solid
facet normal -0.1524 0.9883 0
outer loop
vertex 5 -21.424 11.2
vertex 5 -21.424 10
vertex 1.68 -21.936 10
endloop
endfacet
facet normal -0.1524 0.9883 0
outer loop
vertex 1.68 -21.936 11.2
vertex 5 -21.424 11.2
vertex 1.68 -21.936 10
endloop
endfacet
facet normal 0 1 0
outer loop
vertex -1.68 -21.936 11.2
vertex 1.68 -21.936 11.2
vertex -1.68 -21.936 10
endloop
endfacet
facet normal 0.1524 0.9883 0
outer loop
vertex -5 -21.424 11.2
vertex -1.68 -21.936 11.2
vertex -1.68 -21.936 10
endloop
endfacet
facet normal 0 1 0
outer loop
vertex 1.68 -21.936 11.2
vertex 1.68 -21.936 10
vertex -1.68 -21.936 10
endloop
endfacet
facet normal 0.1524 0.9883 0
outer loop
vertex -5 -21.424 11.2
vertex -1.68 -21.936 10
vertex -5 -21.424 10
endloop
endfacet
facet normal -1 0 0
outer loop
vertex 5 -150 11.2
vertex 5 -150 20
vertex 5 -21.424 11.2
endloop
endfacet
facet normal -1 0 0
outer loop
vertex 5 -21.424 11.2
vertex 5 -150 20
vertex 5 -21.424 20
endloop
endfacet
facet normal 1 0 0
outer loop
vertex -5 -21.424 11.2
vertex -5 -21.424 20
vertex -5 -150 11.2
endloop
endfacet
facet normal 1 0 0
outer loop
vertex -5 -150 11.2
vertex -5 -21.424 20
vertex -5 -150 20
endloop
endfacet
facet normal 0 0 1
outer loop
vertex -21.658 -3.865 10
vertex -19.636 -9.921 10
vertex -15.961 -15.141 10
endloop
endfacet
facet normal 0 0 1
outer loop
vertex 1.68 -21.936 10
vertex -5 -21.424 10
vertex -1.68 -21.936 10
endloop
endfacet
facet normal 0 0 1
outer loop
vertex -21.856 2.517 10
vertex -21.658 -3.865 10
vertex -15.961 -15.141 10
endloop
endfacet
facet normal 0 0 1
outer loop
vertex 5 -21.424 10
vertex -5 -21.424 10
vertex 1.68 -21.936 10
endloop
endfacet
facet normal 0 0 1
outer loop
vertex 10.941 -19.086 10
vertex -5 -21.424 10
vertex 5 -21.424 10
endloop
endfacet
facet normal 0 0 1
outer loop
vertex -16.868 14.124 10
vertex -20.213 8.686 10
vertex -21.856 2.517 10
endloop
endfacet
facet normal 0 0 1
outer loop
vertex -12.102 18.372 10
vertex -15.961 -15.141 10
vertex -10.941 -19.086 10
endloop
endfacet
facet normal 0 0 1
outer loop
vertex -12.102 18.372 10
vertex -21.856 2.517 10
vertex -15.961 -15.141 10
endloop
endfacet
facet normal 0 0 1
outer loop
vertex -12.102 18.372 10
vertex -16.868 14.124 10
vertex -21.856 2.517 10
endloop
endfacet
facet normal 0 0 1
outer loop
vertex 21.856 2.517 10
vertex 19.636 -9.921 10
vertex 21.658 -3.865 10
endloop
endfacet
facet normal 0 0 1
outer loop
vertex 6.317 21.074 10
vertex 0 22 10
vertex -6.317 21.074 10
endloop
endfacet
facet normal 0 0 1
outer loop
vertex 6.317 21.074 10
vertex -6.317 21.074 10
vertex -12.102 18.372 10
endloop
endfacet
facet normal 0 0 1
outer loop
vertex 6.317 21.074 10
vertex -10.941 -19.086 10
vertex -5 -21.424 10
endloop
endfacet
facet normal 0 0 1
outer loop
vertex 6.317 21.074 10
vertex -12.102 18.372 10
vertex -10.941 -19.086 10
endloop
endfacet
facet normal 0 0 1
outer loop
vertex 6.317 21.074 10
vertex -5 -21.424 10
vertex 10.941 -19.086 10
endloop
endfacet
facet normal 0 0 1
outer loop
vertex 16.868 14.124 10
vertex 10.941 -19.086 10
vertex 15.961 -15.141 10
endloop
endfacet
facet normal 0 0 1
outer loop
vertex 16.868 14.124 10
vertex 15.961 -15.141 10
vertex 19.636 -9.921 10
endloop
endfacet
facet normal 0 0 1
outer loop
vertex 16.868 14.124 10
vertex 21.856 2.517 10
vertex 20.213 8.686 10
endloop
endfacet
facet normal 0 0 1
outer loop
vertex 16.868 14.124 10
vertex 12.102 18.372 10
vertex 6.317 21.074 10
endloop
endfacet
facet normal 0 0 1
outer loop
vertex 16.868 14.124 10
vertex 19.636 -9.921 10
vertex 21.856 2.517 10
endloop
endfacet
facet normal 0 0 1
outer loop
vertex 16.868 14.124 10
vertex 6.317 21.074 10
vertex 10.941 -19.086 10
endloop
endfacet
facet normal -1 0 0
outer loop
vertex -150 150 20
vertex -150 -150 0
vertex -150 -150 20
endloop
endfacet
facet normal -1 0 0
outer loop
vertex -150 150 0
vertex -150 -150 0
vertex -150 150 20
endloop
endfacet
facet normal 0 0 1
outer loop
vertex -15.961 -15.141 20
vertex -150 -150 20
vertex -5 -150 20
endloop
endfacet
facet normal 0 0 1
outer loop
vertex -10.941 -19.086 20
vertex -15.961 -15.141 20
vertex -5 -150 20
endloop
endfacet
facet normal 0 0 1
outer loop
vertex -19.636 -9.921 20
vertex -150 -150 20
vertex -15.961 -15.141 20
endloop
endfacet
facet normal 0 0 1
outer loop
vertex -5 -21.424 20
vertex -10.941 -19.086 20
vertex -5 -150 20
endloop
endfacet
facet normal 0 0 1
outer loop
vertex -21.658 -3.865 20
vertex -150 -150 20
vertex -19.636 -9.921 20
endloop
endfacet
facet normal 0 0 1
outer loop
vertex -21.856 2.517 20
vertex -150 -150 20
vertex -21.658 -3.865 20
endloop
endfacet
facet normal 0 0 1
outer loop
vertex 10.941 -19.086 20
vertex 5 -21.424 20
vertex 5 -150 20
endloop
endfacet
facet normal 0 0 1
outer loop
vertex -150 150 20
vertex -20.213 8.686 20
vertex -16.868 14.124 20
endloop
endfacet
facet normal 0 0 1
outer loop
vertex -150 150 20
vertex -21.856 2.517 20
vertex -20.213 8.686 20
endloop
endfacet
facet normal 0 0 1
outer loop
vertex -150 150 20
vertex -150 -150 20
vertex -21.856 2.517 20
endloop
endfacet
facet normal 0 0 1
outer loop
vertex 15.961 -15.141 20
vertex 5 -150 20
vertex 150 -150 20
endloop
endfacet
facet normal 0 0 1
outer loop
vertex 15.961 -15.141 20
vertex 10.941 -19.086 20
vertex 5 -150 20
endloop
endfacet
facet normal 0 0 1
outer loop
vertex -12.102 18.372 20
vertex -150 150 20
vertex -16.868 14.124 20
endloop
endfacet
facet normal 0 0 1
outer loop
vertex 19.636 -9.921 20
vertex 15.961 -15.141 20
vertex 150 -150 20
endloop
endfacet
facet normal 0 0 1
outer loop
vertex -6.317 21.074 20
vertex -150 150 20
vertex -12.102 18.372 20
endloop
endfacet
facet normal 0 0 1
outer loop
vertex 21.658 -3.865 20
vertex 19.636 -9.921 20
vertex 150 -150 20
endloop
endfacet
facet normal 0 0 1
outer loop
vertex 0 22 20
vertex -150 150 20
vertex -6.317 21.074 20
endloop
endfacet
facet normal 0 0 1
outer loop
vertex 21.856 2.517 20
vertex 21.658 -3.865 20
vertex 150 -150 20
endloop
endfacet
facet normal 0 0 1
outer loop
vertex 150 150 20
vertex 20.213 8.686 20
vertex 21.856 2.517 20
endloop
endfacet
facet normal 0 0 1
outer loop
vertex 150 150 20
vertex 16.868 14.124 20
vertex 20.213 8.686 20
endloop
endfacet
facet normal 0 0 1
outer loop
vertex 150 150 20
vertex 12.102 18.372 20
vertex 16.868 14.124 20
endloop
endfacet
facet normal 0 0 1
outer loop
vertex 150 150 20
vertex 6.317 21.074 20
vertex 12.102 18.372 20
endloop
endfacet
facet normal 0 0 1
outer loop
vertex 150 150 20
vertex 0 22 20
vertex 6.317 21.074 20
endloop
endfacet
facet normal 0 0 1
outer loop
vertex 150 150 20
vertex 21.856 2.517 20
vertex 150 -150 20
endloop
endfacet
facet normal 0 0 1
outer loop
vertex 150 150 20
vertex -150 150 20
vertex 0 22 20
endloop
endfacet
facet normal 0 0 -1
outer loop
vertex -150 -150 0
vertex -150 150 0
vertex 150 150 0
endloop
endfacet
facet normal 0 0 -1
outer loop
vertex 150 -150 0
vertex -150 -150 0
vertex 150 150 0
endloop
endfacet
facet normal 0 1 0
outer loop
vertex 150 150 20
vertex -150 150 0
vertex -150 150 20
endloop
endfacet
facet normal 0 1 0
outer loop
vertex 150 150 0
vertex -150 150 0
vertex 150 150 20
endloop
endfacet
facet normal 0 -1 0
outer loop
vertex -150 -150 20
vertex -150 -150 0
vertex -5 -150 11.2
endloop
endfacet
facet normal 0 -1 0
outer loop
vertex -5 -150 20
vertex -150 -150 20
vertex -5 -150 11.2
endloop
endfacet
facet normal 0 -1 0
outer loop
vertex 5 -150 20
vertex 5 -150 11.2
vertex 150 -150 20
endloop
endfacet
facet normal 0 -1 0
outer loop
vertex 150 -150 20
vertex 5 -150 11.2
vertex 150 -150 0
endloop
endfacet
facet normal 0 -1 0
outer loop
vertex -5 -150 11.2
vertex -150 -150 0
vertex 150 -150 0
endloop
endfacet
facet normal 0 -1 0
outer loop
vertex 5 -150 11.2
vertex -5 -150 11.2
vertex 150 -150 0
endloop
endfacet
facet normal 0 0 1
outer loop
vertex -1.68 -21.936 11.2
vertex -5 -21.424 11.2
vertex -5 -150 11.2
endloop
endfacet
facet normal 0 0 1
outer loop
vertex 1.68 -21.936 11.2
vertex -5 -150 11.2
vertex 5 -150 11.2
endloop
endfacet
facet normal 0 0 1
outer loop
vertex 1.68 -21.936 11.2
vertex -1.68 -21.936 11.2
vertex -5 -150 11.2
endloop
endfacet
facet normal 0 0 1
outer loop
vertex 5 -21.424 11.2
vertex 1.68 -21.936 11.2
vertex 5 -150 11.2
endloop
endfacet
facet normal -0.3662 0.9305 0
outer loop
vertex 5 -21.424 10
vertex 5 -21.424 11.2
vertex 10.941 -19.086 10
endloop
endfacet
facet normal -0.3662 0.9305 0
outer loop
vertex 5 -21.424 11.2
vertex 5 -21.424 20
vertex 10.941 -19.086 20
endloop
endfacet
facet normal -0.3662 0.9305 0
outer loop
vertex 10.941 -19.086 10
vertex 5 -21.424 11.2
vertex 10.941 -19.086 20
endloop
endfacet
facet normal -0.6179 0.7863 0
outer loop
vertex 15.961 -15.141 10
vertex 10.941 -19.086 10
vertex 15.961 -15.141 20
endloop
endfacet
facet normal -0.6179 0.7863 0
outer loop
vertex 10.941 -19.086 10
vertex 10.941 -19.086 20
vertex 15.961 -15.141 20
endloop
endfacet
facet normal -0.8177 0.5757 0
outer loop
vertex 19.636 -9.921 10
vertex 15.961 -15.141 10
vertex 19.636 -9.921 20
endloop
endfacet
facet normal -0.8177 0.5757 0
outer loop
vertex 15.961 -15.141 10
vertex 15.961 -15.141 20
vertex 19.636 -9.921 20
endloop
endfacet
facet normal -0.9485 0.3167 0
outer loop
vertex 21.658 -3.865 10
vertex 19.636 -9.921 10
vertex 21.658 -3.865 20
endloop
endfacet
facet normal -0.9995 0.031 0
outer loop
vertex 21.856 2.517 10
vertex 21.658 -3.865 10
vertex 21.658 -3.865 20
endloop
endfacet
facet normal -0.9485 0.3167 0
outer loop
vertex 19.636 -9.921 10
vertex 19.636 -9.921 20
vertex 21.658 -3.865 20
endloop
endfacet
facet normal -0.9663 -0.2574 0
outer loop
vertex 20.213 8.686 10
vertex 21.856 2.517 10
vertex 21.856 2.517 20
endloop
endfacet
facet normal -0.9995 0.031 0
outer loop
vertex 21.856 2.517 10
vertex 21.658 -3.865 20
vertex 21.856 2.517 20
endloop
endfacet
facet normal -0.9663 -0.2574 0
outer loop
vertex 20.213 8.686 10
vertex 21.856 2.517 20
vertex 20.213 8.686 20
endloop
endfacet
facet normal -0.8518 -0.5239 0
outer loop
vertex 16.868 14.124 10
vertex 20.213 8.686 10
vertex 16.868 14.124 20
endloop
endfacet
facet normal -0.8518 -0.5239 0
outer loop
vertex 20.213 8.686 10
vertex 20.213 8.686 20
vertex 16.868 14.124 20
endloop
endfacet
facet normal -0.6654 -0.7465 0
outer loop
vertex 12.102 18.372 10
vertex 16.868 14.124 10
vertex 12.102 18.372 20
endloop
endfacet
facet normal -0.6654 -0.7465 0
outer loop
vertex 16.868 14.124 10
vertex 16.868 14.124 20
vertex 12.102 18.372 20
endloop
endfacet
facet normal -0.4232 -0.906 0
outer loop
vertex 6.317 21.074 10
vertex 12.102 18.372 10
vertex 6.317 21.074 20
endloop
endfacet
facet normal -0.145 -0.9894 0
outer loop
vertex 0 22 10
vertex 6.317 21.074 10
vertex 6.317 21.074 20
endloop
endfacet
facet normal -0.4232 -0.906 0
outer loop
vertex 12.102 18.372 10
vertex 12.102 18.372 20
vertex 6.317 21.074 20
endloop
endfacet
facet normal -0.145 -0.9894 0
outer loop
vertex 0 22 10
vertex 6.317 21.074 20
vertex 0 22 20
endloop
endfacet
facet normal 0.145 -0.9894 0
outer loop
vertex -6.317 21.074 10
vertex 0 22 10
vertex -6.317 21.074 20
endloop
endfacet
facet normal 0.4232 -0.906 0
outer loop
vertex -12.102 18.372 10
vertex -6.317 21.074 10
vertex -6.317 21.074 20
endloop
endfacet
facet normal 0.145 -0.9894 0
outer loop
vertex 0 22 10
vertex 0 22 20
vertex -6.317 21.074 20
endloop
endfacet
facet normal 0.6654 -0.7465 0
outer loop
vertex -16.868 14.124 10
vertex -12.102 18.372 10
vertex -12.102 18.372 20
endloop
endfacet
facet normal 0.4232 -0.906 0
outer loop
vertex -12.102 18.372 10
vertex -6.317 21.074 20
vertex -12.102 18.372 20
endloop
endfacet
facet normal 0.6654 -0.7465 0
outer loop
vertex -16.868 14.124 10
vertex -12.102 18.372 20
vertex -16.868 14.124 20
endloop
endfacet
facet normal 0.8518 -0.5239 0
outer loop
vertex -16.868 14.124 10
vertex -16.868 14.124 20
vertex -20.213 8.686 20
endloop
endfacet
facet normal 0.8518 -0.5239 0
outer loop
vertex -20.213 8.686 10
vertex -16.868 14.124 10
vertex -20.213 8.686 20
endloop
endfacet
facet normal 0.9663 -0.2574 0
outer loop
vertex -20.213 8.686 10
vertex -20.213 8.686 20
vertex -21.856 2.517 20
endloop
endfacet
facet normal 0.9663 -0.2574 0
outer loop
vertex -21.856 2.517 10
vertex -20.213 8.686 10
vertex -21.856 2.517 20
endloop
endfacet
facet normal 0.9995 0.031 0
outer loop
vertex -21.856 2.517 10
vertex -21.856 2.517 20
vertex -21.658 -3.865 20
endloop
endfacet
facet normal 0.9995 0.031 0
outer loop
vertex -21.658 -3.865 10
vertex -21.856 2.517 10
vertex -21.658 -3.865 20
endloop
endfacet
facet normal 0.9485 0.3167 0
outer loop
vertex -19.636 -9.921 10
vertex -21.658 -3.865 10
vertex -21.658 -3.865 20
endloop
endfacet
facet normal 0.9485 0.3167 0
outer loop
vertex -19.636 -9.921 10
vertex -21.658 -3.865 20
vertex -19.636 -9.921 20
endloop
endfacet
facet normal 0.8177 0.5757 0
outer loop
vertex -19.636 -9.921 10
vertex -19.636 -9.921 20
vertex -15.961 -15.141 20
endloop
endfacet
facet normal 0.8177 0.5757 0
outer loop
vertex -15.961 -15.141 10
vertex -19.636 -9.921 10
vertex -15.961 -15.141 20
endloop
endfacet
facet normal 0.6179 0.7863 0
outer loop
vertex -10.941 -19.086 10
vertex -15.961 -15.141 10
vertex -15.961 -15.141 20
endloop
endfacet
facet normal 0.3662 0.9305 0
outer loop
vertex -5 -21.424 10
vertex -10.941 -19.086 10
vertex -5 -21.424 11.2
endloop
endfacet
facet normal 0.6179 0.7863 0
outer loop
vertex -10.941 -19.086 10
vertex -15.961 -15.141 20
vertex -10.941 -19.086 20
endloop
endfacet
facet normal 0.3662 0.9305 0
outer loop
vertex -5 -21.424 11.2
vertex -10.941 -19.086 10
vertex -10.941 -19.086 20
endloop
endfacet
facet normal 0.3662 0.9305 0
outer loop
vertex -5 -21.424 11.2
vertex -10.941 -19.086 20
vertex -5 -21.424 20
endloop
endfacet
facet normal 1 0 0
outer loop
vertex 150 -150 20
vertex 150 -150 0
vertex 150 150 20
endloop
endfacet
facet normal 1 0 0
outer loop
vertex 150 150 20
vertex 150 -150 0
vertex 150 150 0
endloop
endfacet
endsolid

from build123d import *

# Parameters (mm, degrees)
F0_W     = 300
F0_H     = 300
F1_DEPTH = 20
F3_DEPTH = 10
F4_DEPTH = 8.8
F6_DEPTH = 1.2


with BuildPart() as f1:
    # F0 (on Top) → F1 (new body)
    with BuildSketch(Plane.XY):
        Rectangle(F0_W, F0_H)
    extrude(amount=F1_DEPTH)

    # F2 (on face) → F3 (cut)
    with BuildSketch(Plane.XY.offset(20)):
        with BuildLine():
            Line((-5, -21.4242852856), (-5, -150))
            Line((-5, -150), (5, -150))
            Line((5, -150), (5, -21.4242852856))
            ThreePointArc((5, -21.4242852856), (0, 22), (-5, -21.4242852856))
        make_face()
    extrude(amount=-F3_DEPTH, mode=Mode.SUBTRACT)

    # F2 (on face) → F4 (cut)
    with BuildSketch(Plane.XY.offset(20)):
        with BuildLine():
            Line((-5, -21.4242852856), (-5, -150))
            Line((-5, -150), (5, -150))
            Line((5, -150), (5, -21.4242852856))
            ThreePointArc((5, -21.4242852856), (0, 22), (-5, -21.4242852856))
        make_face()
    extrude(amount=-F4_DEPTH, mode=Mode.SUBTRACT)

    # F5 (on face) → F6 (join)
    with BuildSketch(Plane.XY.offset(10)):
        with BuildLine():
            ThreePointArc((5, -21.4242852856), (0, -22), (-5, -21.4242852856))
            Line((-5, -21.4242852856), (-5, -150))
            Line((-5, -150), (5, -150))
            Line((5, -150), (5, -21.4242852856))
        make_face()
    extrude(amount=F6_DEPTH)


solid = f1.part
